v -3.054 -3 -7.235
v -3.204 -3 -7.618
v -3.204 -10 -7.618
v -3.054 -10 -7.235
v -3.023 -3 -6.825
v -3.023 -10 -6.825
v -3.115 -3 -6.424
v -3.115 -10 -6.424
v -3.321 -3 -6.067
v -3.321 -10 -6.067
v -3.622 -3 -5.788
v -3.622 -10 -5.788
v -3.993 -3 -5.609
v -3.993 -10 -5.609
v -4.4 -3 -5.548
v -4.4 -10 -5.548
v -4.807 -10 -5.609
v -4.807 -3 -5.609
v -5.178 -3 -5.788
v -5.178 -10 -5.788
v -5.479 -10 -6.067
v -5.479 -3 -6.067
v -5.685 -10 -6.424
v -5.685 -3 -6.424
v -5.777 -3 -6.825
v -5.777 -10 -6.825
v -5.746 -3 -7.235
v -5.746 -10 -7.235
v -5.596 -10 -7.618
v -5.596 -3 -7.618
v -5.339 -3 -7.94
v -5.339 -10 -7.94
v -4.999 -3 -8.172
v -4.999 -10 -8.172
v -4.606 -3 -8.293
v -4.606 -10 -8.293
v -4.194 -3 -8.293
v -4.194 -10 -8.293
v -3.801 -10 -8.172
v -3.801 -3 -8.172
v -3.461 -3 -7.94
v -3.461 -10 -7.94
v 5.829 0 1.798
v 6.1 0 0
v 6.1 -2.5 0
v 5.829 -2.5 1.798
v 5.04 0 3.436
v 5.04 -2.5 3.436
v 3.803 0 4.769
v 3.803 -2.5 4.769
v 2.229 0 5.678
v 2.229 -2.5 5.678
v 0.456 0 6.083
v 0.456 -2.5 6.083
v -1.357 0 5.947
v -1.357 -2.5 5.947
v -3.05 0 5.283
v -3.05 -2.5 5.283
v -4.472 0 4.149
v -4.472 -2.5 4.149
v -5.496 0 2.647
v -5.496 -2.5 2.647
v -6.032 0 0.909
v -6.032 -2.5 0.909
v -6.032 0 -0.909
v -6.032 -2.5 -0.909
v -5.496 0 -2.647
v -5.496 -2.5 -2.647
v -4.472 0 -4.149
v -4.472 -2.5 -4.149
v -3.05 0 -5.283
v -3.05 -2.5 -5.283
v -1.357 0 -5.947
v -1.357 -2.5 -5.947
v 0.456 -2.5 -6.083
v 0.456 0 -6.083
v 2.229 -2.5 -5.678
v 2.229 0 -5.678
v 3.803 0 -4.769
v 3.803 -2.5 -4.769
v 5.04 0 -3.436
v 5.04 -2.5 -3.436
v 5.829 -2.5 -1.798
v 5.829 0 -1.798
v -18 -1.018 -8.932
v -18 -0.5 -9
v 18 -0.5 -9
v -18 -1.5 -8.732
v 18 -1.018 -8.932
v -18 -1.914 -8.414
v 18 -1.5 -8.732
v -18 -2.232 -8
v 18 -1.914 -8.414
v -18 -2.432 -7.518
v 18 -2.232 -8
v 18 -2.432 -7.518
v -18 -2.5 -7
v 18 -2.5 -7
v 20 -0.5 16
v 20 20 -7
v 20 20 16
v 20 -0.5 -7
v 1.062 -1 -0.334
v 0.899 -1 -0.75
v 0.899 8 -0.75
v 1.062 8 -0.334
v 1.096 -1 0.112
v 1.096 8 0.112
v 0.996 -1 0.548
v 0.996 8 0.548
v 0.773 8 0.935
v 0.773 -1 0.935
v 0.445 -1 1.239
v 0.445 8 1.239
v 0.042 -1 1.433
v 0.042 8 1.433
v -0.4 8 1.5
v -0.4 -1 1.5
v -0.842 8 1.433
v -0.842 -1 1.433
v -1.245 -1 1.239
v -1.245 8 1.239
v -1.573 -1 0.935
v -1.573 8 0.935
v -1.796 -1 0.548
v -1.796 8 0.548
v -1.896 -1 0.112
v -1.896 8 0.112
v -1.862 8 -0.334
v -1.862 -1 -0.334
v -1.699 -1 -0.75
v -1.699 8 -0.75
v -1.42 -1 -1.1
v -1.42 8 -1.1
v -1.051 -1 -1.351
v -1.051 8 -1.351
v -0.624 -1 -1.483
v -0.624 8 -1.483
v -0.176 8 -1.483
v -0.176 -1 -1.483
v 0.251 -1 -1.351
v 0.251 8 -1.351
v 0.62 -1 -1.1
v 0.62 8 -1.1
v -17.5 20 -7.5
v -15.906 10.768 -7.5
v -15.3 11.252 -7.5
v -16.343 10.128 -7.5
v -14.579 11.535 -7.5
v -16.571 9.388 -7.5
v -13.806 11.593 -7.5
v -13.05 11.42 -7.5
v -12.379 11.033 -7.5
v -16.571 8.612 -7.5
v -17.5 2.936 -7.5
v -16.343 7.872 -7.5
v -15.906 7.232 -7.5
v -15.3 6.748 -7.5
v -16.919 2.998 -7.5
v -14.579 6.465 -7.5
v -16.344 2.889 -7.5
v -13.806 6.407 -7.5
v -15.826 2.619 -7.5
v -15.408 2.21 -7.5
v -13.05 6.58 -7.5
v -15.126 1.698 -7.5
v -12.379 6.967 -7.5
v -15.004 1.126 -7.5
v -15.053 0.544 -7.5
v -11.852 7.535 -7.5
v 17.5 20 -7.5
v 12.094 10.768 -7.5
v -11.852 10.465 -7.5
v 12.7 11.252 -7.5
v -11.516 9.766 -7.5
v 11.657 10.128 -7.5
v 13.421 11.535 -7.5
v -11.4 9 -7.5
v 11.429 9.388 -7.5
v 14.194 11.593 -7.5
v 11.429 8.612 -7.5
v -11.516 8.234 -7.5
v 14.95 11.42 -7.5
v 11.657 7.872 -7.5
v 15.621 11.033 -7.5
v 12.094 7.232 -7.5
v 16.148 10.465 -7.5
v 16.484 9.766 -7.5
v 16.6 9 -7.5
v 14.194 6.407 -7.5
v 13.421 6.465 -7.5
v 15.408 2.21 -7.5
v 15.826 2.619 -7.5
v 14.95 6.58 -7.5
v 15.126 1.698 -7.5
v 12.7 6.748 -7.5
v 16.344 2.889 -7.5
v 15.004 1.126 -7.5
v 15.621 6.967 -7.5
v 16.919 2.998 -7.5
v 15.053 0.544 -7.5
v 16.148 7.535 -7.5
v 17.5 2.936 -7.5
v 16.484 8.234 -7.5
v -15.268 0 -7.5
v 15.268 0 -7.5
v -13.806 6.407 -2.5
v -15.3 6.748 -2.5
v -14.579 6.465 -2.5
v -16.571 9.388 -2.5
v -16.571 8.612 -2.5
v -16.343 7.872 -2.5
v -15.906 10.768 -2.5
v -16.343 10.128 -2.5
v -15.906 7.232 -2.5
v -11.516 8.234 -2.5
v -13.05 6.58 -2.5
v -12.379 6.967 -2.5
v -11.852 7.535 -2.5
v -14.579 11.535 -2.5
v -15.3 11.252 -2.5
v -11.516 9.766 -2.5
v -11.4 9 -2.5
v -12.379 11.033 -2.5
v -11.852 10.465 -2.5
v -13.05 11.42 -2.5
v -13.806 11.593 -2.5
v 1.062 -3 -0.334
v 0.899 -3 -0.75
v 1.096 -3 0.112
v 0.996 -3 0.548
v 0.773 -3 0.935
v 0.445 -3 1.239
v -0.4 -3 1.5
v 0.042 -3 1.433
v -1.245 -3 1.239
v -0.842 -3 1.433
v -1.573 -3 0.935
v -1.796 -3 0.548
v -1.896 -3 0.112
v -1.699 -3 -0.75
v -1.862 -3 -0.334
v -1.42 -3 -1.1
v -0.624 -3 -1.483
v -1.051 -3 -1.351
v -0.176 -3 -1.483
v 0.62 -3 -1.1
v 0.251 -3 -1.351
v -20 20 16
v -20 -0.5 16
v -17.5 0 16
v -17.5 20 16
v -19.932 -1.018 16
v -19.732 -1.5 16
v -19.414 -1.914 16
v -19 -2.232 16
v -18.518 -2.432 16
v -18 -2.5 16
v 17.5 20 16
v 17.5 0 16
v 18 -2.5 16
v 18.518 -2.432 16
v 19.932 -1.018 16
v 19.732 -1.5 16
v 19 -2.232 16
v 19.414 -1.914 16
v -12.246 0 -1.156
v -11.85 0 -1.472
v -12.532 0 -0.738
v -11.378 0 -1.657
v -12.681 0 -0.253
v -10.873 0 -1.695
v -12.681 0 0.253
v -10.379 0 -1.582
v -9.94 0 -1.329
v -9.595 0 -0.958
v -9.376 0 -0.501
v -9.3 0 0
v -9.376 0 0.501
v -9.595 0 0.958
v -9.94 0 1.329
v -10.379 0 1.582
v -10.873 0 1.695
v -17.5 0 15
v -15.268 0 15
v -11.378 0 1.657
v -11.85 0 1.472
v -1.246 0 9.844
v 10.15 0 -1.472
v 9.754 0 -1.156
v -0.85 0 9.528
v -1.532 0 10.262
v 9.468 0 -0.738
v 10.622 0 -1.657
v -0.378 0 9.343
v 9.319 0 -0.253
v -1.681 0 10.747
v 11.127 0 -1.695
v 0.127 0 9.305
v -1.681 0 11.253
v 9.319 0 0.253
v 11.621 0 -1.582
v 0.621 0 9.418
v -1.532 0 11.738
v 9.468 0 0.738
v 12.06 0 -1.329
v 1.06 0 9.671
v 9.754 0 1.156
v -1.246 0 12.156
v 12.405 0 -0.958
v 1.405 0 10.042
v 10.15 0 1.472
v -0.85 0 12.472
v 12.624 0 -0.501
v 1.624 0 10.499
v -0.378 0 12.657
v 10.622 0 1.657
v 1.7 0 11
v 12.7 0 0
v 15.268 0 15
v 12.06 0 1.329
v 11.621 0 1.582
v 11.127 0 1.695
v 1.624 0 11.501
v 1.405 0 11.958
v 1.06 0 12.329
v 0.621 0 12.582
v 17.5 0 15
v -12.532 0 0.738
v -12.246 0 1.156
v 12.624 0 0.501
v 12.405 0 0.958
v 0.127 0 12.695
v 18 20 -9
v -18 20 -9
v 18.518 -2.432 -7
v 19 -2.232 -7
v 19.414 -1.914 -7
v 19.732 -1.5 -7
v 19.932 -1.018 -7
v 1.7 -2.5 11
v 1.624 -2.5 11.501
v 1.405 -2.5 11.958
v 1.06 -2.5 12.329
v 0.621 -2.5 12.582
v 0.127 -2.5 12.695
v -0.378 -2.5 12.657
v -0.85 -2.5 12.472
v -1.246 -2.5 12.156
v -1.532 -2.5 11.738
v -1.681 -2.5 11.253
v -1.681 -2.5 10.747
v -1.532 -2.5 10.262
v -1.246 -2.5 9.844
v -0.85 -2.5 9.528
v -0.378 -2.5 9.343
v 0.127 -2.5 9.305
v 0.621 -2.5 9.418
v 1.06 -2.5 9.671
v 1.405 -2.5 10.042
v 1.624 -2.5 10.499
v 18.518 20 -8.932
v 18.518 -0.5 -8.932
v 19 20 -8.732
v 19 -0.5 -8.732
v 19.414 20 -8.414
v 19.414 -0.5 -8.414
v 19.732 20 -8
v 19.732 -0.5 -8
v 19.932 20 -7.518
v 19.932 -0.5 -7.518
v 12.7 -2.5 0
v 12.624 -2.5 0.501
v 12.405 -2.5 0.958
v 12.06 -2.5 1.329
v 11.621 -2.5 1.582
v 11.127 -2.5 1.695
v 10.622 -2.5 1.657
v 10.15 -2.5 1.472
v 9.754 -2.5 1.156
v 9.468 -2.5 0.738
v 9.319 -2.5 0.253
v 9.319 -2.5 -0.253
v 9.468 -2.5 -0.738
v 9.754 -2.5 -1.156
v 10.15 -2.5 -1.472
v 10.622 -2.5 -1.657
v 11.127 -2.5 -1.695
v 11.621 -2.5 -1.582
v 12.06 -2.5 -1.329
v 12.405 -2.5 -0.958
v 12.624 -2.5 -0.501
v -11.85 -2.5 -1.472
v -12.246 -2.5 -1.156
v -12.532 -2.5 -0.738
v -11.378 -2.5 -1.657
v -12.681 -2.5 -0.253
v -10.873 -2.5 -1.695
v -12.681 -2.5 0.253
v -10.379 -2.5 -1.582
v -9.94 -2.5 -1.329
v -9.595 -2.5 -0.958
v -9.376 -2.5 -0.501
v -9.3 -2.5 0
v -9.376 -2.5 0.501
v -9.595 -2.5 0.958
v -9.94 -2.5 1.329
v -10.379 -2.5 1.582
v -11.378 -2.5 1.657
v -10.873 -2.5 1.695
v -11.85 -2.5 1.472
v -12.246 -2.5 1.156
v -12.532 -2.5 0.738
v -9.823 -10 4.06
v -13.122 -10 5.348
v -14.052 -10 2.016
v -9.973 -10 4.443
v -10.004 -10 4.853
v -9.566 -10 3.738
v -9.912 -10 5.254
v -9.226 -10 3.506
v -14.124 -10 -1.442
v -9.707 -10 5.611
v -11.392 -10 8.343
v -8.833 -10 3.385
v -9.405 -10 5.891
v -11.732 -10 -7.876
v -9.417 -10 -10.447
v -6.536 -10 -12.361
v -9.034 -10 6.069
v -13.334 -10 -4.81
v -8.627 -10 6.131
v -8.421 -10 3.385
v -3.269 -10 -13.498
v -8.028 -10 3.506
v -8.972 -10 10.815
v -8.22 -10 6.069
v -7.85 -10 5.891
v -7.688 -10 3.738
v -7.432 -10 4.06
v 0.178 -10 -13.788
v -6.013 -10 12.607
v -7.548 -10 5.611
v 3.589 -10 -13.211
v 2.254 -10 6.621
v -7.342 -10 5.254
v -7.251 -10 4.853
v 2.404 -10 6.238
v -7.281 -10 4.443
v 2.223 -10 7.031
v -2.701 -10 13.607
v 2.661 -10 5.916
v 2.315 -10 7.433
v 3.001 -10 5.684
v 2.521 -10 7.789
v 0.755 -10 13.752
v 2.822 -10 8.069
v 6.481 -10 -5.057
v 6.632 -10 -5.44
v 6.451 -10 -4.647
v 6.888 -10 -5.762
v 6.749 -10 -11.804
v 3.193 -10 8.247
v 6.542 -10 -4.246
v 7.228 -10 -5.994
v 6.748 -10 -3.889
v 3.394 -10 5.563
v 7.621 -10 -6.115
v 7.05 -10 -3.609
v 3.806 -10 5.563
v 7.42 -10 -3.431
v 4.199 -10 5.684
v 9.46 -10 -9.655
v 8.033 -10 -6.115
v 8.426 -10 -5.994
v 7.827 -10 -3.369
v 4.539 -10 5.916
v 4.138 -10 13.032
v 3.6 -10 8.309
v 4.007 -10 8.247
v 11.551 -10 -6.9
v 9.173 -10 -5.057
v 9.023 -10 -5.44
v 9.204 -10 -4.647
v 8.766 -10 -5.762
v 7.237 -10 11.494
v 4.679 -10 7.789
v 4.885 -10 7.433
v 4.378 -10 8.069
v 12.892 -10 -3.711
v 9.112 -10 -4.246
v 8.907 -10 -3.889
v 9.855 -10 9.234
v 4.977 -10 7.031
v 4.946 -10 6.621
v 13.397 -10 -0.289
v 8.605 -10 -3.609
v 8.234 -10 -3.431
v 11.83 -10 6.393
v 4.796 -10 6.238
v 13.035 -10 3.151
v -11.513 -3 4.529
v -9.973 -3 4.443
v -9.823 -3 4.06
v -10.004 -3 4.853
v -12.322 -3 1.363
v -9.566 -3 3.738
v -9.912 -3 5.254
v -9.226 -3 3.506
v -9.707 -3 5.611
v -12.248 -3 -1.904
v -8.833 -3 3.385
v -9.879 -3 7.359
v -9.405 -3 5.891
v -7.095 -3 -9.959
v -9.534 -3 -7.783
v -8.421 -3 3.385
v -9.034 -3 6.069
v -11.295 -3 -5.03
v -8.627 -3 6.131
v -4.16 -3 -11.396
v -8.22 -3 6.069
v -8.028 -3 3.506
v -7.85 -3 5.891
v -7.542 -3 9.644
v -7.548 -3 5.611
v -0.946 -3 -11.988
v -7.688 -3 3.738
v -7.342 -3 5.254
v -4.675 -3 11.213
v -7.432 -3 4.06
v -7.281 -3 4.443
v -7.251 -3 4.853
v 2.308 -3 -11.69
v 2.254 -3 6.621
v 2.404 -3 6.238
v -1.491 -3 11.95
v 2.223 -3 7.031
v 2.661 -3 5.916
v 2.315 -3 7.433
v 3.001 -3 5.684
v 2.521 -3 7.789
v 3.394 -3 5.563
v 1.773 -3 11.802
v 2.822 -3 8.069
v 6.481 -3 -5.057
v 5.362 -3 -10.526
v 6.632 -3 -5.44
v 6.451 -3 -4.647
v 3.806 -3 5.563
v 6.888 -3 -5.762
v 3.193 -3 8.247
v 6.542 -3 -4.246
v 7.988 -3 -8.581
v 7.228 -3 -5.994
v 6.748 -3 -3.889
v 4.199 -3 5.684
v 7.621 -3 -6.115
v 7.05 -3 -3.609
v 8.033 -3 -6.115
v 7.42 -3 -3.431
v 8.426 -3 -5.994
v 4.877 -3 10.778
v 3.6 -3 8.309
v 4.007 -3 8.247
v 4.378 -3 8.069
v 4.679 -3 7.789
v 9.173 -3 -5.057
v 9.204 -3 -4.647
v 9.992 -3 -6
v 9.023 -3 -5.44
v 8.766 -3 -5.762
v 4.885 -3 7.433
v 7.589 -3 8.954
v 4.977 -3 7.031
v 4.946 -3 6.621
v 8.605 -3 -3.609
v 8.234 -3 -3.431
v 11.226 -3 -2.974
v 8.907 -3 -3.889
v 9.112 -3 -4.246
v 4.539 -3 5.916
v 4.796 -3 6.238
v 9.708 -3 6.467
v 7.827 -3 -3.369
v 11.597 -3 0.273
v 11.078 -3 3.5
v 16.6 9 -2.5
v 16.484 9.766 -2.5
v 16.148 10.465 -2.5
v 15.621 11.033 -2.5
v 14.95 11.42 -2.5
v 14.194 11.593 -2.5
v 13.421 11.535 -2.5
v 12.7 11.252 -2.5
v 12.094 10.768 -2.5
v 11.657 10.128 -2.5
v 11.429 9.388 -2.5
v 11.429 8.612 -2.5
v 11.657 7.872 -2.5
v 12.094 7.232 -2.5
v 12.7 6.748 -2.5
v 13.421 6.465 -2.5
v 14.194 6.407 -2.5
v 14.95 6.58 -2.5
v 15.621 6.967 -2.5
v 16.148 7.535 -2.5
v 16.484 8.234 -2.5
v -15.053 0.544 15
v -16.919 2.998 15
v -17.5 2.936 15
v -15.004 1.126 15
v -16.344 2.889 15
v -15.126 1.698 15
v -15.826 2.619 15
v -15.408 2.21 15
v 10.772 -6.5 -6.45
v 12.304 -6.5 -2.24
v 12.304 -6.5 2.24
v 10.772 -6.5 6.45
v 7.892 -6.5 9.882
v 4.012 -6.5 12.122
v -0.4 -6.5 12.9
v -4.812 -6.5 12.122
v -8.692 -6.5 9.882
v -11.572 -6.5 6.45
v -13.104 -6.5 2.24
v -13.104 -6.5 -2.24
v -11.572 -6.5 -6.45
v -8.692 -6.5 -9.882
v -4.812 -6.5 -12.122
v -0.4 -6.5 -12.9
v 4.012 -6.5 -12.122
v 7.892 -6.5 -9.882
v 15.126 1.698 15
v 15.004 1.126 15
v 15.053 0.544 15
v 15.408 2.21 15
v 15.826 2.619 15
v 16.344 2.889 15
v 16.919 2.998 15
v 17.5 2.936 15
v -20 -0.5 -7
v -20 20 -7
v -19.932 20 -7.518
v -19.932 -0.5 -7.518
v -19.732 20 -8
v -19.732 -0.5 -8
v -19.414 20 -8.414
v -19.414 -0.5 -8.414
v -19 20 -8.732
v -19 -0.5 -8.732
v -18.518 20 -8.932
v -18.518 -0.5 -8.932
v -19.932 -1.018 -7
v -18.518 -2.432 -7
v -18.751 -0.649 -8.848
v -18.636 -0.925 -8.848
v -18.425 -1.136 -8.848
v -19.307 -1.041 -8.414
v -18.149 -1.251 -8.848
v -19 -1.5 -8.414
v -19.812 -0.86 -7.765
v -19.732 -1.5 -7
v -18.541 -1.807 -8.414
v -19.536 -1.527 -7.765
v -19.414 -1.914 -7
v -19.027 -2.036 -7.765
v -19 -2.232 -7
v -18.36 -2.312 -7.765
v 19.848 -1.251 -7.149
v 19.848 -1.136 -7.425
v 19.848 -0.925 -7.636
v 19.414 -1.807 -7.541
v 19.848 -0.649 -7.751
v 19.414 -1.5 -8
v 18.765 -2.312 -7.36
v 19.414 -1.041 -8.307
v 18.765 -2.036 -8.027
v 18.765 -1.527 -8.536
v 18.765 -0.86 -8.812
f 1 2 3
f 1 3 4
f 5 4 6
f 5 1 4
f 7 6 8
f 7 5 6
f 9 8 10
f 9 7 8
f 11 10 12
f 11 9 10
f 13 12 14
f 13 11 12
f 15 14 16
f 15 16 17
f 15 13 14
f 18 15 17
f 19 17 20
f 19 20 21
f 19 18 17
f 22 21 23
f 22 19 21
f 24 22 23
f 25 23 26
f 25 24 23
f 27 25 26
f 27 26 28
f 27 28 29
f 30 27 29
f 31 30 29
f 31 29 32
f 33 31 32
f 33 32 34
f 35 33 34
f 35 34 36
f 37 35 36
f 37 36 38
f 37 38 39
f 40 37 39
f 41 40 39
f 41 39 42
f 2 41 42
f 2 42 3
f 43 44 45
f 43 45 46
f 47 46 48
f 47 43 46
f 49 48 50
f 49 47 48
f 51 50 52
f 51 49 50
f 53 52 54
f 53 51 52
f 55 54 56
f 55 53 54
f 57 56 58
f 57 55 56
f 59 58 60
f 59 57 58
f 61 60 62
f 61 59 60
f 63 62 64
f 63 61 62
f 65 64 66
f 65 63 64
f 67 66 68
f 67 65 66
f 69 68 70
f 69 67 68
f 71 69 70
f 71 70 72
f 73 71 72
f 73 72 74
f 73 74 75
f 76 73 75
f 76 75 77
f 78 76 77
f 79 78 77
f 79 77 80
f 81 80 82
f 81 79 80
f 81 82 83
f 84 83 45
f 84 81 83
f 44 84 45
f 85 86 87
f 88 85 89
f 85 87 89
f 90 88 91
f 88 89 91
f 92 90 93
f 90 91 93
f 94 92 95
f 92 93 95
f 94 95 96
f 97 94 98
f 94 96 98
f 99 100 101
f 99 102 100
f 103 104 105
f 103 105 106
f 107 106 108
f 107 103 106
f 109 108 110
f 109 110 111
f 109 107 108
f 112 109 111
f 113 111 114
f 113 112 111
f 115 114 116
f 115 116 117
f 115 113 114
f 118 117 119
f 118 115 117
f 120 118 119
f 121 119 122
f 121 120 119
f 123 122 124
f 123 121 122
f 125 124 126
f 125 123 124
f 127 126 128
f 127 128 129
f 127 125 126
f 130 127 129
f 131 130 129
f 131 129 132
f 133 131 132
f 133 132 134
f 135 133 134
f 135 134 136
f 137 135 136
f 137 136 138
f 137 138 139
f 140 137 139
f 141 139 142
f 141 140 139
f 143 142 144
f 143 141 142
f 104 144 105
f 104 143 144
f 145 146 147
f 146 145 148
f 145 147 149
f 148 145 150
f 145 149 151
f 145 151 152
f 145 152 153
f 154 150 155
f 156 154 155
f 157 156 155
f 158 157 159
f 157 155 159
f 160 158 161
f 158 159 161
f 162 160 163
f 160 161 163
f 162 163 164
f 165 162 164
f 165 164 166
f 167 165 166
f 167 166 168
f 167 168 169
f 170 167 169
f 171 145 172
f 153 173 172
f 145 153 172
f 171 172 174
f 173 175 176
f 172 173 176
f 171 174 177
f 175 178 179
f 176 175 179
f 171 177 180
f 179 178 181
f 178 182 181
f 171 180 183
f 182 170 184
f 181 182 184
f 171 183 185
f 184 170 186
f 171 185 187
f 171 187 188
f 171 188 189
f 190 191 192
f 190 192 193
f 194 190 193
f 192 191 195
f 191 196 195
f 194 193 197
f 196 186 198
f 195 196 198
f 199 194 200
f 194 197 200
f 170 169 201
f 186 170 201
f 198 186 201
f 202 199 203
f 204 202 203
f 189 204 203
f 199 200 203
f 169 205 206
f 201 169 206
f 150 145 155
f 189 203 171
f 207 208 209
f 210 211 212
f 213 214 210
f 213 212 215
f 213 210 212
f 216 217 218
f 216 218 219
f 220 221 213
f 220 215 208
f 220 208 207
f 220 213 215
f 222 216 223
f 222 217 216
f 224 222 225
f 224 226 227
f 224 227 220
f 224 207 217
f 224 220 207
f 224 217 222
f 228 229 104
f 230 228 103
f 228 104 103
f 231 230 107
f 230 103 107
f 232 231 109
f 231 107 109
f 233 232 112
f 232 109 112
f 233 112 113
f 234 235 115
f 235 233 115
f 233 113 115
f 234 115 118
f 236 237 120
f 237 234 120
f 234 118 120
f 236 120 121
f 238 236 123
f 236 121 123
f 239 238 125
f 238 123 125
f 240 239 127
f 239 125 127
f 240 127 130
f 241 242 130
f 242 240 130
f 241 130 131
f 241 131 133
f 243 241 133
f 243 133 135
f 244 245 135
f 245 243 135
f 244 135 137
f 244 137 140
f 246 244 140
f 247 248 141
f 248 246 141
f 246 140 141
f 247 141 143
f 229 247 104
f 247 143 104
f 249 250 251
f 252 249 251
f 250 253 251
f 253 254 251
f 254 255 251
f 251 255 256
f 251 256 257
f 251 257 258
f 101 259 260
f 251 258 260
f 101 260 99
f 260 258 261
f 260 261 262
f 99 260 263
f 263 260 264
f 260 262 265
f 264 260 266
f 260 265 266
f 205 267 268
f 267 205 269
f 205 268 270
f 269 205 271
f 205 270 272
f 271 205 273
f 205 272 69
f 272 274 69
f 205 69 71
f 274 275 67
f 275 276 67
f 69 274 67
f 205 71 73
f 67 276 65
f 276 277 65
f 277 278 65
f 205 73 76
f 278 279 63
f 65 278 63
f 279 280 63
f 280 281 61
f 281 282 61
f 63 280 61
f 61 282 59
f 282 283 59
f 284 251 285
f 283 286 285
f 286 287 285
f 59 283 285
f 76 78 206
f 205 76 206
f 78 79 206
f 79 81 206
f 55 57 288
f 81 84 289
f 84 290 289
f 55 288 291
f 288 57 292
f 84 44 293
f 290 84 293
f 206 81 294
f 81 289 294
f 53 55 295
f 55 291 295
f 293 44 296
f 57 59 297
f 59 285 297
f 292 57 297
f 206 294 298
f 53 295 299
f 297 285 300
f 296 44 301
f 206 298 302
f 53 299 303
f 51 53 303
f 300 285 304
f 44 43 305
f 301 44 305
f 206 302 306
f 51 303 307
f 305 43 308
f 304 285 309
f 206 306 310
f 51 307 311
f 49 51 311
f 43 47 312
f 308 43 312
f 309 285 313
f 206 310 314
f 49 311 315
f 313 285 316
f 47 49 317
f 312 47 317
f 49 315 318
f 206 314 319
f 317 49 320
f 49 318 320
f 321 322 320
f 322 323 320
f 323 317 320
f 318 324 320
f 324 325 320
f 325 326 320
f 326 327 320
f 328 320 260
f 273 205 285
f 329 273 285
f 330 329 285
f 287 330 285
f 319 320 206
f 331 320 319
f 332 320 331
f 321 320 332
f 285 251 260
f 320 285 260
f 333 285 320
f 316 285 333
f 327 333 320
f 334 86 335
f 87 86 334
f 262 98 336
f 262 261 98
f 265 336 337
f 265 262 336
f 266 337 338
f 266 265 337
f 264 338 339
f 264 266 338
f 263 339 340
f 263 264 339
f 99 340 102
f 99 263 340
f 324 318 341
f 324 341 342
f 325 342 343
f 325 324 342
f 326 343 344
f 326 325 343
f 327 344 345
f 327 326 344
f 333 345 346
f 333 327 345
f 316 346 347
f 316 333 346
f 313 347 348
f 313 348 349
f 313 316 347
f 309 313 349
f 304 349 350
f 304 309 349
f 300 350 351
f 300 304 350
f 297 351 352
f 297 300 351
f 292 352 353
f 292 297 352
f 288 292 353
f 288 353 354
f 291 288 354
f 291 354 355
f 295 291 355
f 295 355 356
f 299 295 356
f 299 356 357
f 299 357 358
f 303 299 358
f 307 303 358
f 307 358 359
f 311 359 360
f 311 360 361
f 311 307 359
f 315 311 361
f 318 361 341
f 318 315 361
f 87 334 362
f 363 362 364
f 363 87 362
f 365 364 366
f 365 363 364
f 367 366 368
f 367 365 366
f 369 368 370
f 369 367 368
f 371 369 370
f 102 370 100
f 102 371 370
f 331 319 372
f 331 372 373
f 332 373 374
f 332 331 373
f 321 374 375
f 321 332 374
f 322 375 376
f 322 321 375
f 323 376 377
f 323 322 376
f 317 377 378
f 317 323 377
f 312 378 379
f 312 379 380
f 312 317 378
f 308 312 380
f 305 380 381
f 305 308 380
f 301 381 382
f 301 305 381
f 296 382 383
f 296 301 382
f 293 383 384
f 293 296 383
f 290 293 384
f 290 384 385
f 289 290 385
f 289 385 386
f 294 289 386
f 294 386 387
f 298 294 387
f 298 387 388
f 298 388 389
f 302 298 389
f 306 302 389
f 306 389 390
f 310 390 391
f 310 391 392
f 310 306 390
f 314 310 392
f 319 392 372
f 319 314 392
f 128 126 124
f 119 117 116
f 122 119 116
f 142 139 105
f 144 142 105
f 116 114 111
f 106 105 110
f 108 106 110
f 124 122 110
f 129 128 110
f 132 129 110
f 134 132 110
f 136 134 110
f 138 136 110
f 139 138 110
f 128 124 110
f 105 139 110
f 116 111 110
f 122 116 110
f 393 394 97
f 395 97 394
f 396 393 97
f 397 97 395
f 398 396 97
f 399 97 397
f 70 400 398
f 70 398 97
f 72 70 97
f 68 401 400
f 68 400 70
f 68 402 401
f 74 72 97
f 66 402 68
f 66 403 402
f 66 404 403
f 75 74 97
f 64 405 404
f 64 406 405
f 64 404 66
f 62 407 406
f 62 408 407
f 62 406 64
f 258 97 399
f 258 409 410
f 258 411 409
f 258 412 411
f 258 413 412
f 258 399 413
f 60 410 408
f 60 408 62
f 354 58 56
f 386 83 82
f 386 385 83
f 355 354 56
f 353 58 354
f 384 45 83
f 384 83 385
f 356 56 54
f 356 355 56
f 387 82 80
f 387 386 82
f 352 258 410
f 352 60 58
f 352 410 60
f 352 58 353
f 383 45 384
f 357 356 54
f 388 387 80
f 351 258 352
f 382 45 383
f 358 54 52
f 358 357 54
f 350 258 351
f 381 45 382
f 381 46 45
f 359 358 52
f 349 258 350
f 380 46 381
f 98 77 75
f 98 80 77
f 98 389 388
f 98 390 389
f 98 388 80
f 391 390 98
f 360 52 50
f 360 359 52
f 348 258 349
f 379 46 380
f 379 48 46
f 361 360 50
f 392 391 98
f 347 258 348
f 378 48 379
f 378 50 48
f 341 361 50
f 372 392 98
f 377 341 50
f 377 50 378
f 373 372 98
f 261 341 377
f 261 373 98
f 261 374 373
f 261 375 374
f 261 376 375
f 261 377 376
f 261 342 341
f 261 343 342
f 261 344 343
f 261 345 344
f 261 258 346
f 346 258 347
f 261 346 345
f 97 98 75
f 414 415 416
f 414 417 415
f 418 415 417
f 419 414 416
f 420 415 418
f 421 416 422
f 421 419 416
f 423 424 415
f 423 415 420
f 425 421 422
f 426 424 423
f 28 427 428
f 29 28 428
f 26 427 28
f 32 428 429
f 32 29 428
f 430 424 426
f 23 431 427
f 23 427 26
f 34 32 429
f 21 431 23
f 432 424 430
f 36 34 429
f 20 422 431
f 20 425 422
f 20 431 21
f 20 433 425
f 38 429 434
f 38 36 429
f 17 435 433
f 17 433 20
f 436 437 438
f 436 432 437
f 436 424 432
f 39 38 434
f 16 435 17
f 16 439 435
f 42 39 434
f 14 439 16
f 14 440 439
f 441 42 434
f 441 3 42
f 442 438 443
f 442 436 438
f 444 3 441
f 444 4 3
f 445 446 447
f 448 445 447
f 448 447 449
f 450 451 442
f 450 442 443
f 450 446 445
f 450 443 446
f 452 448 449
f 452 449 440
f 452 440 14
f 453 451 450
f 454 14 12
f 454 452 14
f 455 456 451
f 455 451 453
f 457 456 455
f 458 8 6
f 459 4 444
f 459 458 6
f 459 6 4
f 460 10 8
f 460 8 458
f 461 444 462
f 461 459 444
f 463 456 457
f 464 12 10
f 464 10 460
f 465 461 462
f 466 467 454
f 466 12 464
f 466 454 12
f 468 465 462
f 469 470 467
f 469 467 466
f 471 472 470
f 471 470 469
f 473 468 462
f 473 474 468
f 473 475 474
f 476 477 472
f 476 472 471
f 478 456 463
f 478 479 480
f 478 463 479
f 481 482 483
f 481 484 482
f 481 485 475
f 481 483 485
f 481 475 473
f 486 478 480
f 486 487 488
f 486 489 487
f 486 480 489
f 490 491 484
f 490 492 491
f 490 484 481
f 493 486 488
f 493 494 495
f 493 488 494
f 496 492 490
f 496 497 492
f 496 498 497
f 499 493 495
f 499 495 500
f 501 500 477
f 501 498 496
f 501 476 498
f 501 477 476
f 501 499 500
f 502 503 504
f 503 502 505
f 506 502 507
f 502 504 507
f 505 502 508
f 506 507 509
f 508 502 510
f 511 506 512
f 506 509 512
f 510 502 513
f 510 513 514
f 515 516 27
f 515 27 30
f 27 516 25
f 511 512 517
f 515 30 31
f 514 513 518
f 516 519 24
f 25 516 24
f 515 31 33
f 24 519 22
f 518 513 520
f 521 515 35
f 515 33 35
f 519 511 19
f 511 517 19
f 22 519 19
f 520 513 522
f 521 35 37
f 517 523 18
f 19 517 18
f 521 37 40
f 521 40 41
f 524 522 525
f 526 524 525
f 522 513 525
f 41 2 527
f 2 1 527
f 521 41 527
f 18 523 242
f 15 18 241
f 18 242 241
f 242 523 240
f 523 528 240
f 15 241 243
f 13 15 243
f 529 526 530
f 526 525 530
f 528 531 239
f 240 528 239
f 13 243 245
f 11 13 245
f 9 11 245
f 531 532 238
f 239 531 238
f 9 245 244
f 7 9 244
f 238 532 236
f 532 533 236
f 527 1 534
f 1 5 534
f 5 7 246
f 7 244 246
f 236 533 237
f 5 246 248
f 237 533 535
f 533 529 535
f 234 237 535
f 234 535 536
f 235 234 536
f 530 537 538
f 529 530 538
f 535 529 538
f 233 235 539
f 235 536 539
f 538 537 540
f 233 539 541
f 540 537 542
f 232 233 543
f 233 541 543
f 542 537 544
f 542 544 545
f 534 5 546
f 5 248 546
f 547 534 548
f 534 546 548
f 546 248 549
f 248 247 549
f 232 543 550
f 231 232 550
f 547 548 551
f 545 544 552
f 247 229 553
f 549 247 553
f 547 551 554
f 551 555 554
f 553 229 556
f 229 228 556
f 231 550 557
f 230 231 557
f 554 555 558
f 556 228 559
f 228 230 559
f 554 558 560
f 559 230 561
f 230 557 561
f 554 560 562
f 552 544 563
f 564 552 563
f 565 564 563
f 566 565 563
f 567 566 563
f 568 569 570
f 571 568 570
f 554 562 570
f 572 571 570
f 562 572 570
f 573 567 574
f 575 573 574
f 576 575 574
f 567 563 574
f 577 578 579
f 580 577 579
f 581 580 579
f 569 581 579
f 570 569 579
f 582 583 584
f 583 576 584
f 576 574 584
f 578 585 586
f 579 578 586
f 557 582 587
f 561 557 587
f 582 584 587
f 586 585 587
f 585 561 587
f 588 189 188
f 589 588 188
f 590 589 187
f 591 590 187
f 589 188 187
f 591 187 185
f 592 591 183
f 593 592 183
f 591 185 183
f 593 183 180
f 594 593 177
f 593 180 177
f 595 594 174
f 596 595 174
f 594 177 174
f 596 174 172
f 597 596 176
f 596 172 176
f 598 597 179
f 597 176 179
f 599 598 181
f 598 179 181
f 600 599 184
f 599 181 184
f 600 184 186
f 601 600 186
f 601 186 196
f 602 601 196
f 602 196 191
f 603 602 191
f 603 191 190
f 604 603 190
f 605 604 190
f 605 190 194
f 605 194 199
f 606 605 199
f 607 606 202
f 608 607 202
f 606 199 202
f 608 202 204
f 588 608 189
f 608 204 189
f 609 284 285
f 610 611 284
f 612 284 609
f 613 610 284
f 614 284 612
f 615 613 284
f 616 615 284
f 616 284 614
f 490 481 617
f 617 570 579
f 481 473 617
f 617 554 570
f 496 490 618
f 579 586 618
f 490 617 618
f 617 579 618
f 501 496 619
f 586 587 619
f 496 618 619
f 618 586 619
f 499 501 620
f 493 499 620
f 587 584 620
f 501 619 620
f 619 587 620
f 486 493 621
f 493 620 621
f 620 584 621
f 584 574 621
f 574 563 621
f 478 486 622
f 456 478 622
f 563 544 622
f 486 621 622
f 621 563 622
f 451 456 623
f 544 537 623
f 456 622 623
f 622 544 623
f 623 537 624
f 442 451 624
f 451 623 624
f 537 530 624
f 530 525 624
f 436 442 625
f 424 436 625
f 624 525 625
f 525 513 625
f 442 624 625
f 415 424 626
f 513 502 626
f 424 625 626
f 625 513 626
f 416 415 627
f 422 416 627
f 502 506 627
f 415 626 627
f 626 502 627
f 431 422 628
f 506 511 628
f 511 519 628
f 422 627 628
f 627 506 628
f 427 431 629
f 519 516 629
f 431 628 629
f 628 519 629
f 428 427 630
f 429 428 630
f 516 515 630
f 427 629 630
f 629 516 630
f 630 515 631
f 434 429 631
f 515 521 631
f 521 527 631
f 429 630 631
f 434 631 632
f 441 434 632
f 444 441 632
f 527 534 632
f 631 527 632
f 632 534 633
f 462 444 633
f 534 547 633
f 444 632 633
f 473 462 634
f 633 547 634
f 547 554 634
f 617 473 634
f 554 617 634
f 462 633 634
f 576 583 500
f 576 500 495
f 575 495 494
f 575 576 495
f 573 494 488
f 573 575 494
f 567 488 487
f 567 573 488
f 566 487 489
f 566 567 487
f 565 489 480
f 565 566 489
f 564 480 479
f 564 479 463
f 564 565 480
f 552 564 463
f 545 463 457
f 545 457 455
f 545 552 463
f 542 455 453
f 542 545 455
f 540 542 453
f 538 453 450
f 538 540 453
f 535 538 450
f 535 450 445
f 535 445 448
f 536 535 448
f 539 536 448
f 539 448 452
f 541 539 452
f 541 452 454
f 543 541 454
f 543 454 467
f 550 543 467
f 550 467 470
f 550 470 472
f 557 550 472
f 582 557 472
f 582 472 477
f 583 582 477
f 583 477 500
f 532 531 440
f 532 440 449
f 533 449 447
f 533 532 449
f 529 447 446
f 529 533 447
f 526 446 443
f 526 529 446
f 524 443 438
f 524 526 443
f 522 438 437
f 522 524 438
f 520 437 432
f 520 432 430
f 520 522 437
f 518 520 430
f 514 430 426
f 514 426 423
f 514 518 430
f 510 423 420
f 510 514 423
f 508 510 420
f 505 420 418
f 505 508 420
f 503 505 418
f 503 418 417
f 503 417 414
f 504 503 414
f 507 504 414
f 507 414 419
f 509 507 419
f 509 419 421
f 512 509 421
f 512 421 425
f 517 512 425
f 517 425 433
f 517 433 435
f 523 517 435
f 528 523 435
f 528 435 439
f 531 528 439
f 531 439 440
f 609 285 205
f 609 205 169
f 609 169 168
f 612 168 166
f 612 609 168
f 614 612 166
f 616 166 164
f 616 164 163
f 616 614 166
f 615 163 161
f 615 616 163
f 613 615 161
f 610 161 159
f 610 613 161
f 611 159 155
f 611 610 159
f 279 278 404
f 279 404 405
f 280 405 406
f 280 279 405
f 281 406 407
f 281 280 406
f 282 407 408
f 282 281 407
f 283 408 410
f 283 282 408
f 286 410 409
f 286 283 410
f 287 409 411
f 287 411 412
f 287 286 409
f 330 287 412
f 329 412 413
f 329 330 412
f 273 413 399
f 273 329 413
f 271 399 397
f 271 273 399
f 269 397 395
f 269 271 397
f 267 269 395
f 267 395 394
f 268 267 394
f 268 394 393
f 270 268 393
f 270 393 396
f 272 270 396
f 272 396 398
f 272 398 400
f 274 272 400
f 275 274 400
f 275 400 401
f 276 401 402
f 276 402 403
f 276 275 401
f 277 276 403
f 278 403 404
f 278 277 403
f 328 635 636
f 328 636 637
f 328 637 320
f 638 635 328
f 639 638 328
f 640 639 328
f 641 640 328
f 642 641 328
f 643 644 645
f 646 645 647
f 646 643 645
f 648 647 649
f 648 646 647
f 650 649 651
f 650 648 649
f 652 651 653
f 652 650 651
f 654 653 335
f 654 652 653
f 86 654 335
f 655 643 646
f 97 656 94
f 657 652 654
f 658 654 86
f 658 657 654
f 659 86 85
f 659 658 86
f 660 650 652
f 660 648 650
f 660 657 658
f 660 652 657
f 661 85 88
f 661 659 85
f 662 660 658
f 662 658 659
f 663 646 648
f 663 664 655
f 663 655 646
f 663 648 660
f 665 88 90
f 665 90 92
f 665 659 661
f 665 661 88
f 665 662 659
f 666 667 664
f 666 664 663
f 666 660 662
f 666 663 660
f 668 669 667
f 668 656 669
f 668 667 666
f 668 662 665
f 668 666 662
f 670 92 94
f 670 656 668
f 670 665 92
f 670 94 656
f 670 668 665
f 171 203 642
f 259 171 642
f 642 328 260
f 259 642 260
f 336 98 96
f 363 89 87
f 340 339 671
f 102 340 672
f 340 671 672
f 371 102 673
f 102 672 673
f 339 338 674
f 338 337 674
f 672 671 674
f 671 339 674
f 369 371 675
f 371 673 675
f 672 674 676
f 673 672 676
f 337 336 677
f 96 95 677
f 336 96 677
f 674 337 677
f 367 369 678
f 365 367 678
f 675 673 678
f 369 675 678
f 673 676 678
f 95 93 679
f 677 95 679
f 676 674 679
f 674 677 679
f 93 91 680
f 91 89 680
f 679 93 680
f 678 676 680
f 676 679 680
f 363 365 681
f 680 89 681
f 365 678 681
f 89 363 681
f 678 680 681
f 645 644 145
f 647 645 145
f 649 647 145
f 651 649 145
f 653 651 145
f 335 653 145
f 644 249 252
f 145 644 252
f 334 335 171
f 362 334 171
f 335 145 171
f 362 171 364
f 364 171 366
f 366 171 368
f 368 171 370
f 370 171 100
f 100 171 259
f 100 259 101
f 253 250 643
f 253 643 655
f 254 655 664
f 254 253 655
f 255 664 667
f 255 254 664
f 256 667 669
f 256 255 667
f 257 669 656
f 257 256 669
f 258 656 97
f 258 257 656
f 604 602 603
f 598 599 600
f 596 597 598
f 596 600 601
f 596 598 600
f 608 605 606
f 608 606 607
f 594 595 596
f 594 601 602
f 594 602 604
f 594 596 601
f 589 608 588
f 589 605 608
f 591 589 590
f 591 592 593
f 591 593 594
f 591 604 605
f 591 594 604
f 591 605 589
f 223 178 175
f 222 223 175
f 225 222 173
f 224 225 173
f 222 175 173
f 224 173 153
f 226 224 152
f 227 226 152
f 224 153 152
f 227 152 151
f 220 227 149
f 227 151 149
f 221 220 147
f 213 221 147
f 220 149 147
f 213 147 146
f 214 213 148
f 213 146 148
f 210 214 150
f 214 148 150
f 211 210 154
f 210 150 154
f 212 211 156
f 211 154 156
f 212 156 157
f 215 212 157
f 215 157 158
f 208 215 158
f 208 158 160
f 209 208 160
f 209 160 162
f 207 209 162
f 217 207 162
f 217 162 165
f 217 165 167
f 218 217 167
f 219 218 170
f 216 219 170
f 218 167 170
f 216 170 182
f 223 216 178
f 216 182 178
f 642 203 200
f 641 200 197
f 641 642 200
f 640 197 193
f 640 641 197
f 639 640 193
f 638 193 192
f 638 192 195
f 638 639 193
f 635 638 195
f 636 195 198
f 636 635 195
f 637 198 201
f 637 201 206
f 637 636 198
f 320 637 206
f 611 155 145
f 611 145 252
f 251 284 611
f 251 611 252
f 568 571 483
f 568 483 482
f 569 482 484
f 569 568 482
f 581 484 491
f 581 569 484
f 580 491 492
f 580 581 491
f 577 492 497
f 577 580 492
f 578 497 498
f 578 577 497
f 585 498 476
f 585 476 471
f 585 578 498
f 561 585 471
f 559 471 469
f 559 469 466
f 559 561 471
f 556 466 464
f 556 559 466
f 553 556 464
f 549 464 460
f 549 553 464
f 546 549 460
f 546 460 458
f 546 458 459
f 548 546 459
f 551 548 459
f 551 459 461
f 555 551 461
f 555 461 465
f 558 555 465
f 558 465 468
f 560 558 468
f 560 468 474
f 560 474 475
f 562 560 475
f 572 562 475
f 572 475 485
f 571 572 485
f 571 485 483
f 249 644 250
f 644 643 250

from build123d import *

# Parameters (mm, degrees)
SKETCH_W                = 40
SKETCH_H                = 25
SKETCH_R                = 6.1
SKETCH_R_2              = 1.7
PAD_DEPTH               = 2.5
PAD_DEPTH_BACK          = 20
SKETCH001_W             = 35
SKETCH001_H             = 23.5
POCKET_DEPTH            = 20.001
FILLET_R                = 2
SKETCH002_R             = 2
PAD001_DEPTH            = 15
PAD001_DEPTH_BACK       = 8
SKETCH003_R             = 2.6
PAD002_DEPTH            = 5
SKETCH005_R             = 13.8
SKETCH004_R             = 12
SKETCH006_R             = 1.5
PAD003_DEPTH            = 4
PAD003_DEPTH_BACK       = 9
SKETCH007_R             = 1.380574
POCKET001_DEPTH         = 10
BODY001_PLACEMENT_ANGLE = 30


with BuildPart() as gearbox_motormount:
    # Sketch → Pad (new body, two sides)
    with BuildSketch(Plane.XZ) as pad_sk:
        with Locations((0, 3.5)):
            Rectangle(SKETCH_W, SKETCH_H)
        Circle(SKETCH_R, mode=Mode.SUBTRACT)
        with Locations((11, 0)):
            Circle(SKETCH_R_2, mode=Mode.SUBTRACT)
        with Locations((-11, 0)):
            Circle(SKETCH_R_2, mode=Mode.SUBTRACT)
        with Locations((0, 11)):
            Circle(SKETCH_R_2, mode=Mode.SUBTRACT)
    extrude(amount=PAD_DEPTH)
    extrude(pad_sk.sketch, amount=-PAD_DEPTH_BACK)

    # Sketch001 → Pocket (cut, through all)
    with BuildSketch(Plane.XZ):
        with Locations((0, 4.25)):
            Rectangle(SKETCH001_W, SKETCH001_H)
    extrude(amount=-POCKET_DEPTH, mode=Mode.SUBTRACT)

    # Fillet
    fillet_edges = [gearbox_motormount.edges().sort_by_distance(p)[0] for p in [
        (-20, -2.5, 3.5),
        (-20, 8.75, -9),
        (0, -2.5, -9),
        (20, -2.5, 3.5),
        (20, 8.75, -9),
    ]]
    fillet(fillet_edges, radius=FILLET_R)

    # Sketch002 → Pad001 (join, two sides)
    with BuildSketch(Plane.XY) as pad001_sk:
        with Locations((-17, 1)):
            Circle(SKETCH002_R)
        with Locations((17, 1)):
            Circle(SKETCH002_R)
    extrude(amount=PAD001_DEPTH)
    extrude(pad001_sk.sketch, amount=-PAD001_DEPTH_BACK)

    # Sketch003 → Pad002 (join)
    with BuildSketch(Plane.XY.offset(-7.5)):
        with Locations((-14, 9)):
            Circle(SKETCH003_R)
        with Locations((14, 9)):
            Circle(SKETCH003_R)
    extrude(amount=PAD002_DEPTH)


with BuildPart() as motor_base:
    # Sketch005 → AdditiveLoft section 0
    with BuildSketch(Plane.XZ.offset(10)):
        Circle(SKETCH005_R)
    # Sketch004 → AdditiveLoft section 1
    with BuildSketch(Plane.XZ.offset(3)):
        Circle(SKETCH004_R)
    loft()

    # Sketch006 → Pad003 (new body, two sides)
    with BuildSketch(Plane.XZ.offset(1)) as pad003_sk:
        Circle(SKETCH006_R)
    extrude(amount=PAD003_DEPTH)
    extrude(pad003_sk.sketch, amount=-PAD003_DEPTH_BACK)

    # Sketch007 → Pocket001 (cut)
    with BuildSketch(Plane.XZ):
        with Locations((-9.5, 0)):
            Circle(SKETCH007_R)
        with Locations((9.5, 0)):
            Circle(SKETCH007_R)
        with Locations((0, 8)):
            Circle(SKETCH007_R)
        with Locations((0, -8)):
            Circle(SKETCH007_R)
    extrude(amount=POCKET001_DEPTH, mode=Mode.SUBTRACT)


with BuildPart() as motor_base_1:
    # Body001 placement: moved
    add(motor_base.part.moved(Location((-0.4, 0, 0))).rotate(Axis((-0.4, 0, 0), (0, 1, 0)), BODY001_PLACEMENT_ANGLE))


solid = Compound([gearbox_motormount.part, motor_base_1.part])
